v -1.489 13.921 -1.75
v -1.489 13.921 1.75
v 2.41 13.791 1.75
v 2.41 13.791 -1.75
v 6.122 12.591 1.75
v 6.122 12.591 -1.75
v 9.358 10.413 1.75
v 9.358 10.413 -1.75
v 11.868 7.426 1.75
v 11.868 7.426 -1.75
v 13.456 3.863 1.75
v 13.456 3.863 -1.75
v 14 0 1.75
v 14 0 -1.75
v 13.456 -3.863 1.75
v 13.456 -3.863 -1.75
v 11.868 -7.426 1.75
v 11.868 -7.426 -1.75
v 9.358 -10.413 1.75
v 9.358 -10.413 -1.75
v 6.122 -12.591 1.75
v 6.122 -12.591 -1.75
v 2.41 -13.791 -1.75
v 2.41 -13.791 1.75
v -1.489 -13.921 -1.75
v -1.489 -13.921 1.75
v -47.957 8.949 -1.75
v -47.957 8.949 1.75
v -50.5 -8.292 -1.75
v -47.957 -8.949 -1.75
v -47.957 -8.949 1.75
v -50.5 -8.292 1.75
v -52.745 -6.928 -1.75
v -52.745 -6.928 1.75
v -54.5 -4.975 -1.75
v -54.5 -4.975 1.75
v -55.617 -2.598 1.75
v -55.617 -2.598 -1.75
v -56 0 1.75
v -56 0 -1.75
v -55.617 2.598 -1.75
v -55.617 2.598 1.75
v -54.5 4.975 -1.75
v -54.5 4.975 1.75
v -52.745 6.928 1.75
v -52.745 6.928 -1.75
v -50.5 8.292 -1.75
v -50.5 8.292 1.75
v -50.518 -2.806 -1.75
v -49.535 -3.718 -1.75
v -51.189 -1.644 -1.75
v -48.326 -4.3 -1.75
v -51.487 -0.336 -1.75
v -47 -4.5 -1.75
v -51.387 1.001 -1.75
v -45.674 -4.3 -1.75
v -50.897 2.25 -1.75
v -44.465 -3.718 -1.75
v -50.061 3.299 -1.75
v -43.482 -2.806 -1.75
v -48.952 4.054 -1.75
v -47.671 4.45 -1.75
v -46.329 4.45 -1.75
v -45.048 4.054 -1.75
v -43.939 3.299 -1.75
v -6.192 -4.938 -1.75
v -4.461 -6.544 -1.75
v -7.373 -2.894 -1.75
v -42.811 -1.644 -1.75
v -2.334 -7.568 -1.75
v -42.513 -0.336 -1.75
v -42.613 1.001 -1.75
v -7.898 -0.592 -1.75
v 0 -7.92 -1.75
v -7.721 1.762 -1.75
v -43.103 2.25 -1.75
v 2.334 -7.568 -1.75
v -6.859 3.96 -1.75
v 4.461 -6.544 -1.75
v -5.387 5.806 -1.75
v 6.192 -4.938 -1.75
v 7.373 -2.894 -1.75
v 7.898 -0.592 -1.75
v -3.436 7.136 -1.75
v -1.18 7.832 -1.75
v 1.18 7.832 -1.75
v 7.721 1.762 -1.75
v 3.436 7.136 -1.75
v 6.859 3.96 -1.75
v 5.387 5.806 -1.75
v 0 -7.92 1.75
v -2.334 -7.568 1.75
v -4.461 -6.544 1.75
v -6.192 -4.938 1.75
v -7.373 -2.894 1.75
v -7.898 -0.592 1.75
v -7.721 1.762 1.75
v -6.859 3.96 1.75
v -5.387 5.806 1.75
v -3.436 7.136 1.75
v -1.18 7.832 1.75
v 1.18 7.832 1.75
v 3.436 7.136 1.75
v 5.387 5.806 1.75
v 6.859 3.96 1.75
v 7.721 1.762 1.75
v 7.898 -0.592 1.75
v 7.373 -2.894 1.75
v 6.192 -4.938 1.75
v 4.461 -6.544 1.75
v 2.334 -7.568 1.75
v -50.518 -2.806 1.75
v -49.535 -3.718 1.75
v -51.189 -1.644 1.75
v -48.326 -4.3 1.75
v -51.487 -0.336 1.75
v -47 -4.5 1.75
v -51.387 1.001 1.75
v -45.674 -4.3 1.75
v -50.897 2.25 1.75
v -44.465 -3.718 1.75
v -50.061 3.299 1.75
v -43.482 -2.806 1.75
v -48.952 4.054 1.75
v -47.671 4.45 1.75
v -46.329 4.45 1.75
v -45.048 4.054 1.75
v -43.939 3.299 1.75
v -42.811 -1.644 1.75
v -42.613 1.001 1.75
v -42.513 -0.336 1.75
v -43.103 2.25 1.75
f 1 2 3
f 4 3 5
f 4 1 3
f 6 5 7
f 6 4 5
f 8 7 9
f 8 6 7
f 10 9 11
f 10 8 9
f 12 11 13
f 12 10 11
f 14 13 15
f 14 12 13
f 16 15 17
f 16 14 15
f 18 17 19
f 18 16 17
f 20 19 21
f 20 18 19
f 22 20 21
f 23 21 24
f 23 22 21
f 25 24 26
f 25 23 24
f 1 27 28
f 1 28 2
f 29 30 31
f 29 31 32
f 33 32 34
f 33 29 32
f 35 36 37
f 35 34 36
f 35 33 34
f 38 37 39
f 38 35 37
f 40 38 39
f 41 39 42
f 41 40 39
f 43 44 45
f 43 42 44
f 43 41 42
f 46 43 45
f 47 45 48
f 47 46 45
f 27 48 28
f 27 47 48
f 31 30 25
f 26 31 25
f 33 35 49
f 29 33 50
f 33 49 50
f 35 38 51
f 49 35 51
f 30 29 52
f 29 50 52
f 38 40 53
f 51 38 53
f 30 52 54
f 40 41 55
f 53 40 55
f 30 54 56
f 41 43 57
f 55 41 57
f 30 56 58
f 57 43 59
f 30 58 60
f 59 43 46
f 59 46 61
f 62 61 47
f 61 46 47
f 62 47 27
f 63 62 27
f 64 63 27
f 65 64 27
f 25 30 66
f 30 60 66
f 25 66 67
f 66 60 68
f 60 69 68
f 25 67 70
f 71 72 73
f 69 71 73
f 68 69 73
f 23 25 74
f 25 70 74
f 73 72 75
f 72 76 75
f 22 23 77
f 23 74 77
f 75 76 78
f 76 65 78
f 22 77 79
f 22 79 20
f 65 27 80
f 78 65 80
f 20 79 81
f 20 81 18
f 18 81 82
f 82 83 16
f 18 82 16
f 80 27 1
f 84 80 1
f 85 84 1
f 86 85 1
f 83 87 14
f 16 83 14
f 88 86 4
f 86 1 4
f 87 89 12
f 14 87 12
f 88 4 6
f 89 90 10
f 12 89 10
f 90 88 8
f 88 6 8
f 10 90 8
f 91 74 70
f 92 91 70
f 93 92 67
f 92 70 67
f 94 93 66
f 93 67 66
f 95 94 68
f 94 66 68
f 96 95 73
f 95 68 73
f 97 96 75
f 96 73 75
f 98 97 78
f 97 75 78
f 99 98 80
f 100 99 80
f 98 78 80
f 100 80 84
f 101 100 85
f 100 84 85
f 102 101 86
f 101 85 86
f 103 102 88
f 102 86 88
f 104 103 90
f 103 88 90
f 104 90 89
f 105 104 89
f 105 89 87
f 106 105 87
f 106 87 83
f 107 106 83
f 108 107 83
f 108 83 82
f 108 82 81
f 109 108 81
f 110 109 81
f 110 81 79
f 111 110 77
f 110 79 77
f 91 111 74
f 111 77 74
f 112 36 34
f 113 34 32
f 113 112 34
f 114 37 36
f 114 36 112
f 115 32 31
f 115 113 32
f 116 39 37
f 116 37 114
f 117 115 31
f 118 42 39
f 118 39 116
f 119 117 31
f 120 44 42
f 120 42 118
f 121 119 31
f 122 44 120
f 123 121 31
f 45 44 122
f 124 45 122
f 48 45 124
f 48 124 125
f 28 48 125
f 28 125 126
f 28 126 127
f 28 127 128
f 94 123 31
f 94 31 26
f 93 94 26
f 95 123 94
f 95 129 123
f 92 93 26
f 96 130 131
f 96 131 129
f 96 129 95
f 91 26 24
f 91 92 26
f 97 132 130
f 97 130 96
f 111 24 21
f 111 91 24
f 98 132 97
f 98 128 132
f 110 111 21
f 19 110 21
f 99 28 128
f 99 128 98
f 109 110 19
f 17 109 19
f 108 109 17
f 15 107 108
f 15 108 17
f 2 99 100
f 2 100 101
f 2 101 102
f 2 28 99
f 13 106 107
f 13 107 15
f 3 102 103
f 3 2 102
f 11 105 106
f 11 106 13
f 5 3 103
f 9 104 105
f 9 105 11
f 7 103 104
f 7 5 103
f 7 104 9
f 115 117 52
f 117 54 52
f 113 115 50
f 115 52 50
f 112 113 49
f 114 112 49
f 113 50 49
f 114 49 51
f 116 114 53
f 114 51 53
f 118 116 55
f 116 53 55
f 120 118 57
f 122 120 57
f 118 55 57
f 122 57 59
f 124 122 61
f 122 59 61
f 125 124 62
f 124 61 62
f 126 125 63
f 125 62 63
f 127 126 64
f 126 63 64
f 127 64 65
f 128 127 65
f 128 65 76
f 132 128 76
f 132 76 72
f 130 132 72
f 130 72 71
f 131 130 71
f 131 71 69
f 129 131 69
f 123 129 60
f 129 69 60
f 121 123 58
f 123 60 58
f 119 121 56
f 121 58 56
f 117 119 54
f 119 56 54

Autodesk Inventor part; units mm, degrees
ref_plane "YZ Plane" through (0, 0, 0) normal (1, 0, 0) x (0, 1, 0)
ref_plane "XZ Plane" through (0, 0, 0) normal (0, 1, 0) x (-1, 0, 0)
ref_plane "XY Plane" through (0, 0, 0) normal (0, 0, 1) x (1, 0, 0)
sketch "Sketch1" plane through (0, 0, 0) normal (0, 0, 1) x (1, 0, 0)
  circle A0 centre (0, 0) radius 14
  line L0 (0, 0) -> (-47, 0) construction
  circle A1 centre (-47, 0) radius 9
  line L1 (-47.9574, 8.9489) -> (-1.4894, 13.9206)
  line L2 (-47.9574, -8.9489) -> (-1.4894, -13.9206)
  dimension "d0" = 18
  dimension "d1" = 28
  dimension "d2" = 47
extrude "Extrusion1" add sketch "Sketch1" along normal mid plane 3.5
sketch "Sketch2" plane through (0, 0, 1.75) normal (0, 0, 1) x (1, 0, 0)
  arc A0 (-1.4894, -13.9206) -> (-1.4894, 13.9206) centre (0, 0) ccw projected
hole "Hole1" at (0, 0, 1.75) direction (0, 0, -1) diameter 15.84 end through all
sketch "Sketch3" plane through (0, 0, 1.75) normal (0, 0, 1) x (1, 0, 0)
  arc A0 (-47.9574, 8.9489) -> (-47.9574, -8.9489) centre (-47, 0) ccw projected
hole "Hole2" at (-47, 0, 1.75) direction (0, 0, -1) diameter 9 end through all
properties part number "312-01-02" material "Steel"
